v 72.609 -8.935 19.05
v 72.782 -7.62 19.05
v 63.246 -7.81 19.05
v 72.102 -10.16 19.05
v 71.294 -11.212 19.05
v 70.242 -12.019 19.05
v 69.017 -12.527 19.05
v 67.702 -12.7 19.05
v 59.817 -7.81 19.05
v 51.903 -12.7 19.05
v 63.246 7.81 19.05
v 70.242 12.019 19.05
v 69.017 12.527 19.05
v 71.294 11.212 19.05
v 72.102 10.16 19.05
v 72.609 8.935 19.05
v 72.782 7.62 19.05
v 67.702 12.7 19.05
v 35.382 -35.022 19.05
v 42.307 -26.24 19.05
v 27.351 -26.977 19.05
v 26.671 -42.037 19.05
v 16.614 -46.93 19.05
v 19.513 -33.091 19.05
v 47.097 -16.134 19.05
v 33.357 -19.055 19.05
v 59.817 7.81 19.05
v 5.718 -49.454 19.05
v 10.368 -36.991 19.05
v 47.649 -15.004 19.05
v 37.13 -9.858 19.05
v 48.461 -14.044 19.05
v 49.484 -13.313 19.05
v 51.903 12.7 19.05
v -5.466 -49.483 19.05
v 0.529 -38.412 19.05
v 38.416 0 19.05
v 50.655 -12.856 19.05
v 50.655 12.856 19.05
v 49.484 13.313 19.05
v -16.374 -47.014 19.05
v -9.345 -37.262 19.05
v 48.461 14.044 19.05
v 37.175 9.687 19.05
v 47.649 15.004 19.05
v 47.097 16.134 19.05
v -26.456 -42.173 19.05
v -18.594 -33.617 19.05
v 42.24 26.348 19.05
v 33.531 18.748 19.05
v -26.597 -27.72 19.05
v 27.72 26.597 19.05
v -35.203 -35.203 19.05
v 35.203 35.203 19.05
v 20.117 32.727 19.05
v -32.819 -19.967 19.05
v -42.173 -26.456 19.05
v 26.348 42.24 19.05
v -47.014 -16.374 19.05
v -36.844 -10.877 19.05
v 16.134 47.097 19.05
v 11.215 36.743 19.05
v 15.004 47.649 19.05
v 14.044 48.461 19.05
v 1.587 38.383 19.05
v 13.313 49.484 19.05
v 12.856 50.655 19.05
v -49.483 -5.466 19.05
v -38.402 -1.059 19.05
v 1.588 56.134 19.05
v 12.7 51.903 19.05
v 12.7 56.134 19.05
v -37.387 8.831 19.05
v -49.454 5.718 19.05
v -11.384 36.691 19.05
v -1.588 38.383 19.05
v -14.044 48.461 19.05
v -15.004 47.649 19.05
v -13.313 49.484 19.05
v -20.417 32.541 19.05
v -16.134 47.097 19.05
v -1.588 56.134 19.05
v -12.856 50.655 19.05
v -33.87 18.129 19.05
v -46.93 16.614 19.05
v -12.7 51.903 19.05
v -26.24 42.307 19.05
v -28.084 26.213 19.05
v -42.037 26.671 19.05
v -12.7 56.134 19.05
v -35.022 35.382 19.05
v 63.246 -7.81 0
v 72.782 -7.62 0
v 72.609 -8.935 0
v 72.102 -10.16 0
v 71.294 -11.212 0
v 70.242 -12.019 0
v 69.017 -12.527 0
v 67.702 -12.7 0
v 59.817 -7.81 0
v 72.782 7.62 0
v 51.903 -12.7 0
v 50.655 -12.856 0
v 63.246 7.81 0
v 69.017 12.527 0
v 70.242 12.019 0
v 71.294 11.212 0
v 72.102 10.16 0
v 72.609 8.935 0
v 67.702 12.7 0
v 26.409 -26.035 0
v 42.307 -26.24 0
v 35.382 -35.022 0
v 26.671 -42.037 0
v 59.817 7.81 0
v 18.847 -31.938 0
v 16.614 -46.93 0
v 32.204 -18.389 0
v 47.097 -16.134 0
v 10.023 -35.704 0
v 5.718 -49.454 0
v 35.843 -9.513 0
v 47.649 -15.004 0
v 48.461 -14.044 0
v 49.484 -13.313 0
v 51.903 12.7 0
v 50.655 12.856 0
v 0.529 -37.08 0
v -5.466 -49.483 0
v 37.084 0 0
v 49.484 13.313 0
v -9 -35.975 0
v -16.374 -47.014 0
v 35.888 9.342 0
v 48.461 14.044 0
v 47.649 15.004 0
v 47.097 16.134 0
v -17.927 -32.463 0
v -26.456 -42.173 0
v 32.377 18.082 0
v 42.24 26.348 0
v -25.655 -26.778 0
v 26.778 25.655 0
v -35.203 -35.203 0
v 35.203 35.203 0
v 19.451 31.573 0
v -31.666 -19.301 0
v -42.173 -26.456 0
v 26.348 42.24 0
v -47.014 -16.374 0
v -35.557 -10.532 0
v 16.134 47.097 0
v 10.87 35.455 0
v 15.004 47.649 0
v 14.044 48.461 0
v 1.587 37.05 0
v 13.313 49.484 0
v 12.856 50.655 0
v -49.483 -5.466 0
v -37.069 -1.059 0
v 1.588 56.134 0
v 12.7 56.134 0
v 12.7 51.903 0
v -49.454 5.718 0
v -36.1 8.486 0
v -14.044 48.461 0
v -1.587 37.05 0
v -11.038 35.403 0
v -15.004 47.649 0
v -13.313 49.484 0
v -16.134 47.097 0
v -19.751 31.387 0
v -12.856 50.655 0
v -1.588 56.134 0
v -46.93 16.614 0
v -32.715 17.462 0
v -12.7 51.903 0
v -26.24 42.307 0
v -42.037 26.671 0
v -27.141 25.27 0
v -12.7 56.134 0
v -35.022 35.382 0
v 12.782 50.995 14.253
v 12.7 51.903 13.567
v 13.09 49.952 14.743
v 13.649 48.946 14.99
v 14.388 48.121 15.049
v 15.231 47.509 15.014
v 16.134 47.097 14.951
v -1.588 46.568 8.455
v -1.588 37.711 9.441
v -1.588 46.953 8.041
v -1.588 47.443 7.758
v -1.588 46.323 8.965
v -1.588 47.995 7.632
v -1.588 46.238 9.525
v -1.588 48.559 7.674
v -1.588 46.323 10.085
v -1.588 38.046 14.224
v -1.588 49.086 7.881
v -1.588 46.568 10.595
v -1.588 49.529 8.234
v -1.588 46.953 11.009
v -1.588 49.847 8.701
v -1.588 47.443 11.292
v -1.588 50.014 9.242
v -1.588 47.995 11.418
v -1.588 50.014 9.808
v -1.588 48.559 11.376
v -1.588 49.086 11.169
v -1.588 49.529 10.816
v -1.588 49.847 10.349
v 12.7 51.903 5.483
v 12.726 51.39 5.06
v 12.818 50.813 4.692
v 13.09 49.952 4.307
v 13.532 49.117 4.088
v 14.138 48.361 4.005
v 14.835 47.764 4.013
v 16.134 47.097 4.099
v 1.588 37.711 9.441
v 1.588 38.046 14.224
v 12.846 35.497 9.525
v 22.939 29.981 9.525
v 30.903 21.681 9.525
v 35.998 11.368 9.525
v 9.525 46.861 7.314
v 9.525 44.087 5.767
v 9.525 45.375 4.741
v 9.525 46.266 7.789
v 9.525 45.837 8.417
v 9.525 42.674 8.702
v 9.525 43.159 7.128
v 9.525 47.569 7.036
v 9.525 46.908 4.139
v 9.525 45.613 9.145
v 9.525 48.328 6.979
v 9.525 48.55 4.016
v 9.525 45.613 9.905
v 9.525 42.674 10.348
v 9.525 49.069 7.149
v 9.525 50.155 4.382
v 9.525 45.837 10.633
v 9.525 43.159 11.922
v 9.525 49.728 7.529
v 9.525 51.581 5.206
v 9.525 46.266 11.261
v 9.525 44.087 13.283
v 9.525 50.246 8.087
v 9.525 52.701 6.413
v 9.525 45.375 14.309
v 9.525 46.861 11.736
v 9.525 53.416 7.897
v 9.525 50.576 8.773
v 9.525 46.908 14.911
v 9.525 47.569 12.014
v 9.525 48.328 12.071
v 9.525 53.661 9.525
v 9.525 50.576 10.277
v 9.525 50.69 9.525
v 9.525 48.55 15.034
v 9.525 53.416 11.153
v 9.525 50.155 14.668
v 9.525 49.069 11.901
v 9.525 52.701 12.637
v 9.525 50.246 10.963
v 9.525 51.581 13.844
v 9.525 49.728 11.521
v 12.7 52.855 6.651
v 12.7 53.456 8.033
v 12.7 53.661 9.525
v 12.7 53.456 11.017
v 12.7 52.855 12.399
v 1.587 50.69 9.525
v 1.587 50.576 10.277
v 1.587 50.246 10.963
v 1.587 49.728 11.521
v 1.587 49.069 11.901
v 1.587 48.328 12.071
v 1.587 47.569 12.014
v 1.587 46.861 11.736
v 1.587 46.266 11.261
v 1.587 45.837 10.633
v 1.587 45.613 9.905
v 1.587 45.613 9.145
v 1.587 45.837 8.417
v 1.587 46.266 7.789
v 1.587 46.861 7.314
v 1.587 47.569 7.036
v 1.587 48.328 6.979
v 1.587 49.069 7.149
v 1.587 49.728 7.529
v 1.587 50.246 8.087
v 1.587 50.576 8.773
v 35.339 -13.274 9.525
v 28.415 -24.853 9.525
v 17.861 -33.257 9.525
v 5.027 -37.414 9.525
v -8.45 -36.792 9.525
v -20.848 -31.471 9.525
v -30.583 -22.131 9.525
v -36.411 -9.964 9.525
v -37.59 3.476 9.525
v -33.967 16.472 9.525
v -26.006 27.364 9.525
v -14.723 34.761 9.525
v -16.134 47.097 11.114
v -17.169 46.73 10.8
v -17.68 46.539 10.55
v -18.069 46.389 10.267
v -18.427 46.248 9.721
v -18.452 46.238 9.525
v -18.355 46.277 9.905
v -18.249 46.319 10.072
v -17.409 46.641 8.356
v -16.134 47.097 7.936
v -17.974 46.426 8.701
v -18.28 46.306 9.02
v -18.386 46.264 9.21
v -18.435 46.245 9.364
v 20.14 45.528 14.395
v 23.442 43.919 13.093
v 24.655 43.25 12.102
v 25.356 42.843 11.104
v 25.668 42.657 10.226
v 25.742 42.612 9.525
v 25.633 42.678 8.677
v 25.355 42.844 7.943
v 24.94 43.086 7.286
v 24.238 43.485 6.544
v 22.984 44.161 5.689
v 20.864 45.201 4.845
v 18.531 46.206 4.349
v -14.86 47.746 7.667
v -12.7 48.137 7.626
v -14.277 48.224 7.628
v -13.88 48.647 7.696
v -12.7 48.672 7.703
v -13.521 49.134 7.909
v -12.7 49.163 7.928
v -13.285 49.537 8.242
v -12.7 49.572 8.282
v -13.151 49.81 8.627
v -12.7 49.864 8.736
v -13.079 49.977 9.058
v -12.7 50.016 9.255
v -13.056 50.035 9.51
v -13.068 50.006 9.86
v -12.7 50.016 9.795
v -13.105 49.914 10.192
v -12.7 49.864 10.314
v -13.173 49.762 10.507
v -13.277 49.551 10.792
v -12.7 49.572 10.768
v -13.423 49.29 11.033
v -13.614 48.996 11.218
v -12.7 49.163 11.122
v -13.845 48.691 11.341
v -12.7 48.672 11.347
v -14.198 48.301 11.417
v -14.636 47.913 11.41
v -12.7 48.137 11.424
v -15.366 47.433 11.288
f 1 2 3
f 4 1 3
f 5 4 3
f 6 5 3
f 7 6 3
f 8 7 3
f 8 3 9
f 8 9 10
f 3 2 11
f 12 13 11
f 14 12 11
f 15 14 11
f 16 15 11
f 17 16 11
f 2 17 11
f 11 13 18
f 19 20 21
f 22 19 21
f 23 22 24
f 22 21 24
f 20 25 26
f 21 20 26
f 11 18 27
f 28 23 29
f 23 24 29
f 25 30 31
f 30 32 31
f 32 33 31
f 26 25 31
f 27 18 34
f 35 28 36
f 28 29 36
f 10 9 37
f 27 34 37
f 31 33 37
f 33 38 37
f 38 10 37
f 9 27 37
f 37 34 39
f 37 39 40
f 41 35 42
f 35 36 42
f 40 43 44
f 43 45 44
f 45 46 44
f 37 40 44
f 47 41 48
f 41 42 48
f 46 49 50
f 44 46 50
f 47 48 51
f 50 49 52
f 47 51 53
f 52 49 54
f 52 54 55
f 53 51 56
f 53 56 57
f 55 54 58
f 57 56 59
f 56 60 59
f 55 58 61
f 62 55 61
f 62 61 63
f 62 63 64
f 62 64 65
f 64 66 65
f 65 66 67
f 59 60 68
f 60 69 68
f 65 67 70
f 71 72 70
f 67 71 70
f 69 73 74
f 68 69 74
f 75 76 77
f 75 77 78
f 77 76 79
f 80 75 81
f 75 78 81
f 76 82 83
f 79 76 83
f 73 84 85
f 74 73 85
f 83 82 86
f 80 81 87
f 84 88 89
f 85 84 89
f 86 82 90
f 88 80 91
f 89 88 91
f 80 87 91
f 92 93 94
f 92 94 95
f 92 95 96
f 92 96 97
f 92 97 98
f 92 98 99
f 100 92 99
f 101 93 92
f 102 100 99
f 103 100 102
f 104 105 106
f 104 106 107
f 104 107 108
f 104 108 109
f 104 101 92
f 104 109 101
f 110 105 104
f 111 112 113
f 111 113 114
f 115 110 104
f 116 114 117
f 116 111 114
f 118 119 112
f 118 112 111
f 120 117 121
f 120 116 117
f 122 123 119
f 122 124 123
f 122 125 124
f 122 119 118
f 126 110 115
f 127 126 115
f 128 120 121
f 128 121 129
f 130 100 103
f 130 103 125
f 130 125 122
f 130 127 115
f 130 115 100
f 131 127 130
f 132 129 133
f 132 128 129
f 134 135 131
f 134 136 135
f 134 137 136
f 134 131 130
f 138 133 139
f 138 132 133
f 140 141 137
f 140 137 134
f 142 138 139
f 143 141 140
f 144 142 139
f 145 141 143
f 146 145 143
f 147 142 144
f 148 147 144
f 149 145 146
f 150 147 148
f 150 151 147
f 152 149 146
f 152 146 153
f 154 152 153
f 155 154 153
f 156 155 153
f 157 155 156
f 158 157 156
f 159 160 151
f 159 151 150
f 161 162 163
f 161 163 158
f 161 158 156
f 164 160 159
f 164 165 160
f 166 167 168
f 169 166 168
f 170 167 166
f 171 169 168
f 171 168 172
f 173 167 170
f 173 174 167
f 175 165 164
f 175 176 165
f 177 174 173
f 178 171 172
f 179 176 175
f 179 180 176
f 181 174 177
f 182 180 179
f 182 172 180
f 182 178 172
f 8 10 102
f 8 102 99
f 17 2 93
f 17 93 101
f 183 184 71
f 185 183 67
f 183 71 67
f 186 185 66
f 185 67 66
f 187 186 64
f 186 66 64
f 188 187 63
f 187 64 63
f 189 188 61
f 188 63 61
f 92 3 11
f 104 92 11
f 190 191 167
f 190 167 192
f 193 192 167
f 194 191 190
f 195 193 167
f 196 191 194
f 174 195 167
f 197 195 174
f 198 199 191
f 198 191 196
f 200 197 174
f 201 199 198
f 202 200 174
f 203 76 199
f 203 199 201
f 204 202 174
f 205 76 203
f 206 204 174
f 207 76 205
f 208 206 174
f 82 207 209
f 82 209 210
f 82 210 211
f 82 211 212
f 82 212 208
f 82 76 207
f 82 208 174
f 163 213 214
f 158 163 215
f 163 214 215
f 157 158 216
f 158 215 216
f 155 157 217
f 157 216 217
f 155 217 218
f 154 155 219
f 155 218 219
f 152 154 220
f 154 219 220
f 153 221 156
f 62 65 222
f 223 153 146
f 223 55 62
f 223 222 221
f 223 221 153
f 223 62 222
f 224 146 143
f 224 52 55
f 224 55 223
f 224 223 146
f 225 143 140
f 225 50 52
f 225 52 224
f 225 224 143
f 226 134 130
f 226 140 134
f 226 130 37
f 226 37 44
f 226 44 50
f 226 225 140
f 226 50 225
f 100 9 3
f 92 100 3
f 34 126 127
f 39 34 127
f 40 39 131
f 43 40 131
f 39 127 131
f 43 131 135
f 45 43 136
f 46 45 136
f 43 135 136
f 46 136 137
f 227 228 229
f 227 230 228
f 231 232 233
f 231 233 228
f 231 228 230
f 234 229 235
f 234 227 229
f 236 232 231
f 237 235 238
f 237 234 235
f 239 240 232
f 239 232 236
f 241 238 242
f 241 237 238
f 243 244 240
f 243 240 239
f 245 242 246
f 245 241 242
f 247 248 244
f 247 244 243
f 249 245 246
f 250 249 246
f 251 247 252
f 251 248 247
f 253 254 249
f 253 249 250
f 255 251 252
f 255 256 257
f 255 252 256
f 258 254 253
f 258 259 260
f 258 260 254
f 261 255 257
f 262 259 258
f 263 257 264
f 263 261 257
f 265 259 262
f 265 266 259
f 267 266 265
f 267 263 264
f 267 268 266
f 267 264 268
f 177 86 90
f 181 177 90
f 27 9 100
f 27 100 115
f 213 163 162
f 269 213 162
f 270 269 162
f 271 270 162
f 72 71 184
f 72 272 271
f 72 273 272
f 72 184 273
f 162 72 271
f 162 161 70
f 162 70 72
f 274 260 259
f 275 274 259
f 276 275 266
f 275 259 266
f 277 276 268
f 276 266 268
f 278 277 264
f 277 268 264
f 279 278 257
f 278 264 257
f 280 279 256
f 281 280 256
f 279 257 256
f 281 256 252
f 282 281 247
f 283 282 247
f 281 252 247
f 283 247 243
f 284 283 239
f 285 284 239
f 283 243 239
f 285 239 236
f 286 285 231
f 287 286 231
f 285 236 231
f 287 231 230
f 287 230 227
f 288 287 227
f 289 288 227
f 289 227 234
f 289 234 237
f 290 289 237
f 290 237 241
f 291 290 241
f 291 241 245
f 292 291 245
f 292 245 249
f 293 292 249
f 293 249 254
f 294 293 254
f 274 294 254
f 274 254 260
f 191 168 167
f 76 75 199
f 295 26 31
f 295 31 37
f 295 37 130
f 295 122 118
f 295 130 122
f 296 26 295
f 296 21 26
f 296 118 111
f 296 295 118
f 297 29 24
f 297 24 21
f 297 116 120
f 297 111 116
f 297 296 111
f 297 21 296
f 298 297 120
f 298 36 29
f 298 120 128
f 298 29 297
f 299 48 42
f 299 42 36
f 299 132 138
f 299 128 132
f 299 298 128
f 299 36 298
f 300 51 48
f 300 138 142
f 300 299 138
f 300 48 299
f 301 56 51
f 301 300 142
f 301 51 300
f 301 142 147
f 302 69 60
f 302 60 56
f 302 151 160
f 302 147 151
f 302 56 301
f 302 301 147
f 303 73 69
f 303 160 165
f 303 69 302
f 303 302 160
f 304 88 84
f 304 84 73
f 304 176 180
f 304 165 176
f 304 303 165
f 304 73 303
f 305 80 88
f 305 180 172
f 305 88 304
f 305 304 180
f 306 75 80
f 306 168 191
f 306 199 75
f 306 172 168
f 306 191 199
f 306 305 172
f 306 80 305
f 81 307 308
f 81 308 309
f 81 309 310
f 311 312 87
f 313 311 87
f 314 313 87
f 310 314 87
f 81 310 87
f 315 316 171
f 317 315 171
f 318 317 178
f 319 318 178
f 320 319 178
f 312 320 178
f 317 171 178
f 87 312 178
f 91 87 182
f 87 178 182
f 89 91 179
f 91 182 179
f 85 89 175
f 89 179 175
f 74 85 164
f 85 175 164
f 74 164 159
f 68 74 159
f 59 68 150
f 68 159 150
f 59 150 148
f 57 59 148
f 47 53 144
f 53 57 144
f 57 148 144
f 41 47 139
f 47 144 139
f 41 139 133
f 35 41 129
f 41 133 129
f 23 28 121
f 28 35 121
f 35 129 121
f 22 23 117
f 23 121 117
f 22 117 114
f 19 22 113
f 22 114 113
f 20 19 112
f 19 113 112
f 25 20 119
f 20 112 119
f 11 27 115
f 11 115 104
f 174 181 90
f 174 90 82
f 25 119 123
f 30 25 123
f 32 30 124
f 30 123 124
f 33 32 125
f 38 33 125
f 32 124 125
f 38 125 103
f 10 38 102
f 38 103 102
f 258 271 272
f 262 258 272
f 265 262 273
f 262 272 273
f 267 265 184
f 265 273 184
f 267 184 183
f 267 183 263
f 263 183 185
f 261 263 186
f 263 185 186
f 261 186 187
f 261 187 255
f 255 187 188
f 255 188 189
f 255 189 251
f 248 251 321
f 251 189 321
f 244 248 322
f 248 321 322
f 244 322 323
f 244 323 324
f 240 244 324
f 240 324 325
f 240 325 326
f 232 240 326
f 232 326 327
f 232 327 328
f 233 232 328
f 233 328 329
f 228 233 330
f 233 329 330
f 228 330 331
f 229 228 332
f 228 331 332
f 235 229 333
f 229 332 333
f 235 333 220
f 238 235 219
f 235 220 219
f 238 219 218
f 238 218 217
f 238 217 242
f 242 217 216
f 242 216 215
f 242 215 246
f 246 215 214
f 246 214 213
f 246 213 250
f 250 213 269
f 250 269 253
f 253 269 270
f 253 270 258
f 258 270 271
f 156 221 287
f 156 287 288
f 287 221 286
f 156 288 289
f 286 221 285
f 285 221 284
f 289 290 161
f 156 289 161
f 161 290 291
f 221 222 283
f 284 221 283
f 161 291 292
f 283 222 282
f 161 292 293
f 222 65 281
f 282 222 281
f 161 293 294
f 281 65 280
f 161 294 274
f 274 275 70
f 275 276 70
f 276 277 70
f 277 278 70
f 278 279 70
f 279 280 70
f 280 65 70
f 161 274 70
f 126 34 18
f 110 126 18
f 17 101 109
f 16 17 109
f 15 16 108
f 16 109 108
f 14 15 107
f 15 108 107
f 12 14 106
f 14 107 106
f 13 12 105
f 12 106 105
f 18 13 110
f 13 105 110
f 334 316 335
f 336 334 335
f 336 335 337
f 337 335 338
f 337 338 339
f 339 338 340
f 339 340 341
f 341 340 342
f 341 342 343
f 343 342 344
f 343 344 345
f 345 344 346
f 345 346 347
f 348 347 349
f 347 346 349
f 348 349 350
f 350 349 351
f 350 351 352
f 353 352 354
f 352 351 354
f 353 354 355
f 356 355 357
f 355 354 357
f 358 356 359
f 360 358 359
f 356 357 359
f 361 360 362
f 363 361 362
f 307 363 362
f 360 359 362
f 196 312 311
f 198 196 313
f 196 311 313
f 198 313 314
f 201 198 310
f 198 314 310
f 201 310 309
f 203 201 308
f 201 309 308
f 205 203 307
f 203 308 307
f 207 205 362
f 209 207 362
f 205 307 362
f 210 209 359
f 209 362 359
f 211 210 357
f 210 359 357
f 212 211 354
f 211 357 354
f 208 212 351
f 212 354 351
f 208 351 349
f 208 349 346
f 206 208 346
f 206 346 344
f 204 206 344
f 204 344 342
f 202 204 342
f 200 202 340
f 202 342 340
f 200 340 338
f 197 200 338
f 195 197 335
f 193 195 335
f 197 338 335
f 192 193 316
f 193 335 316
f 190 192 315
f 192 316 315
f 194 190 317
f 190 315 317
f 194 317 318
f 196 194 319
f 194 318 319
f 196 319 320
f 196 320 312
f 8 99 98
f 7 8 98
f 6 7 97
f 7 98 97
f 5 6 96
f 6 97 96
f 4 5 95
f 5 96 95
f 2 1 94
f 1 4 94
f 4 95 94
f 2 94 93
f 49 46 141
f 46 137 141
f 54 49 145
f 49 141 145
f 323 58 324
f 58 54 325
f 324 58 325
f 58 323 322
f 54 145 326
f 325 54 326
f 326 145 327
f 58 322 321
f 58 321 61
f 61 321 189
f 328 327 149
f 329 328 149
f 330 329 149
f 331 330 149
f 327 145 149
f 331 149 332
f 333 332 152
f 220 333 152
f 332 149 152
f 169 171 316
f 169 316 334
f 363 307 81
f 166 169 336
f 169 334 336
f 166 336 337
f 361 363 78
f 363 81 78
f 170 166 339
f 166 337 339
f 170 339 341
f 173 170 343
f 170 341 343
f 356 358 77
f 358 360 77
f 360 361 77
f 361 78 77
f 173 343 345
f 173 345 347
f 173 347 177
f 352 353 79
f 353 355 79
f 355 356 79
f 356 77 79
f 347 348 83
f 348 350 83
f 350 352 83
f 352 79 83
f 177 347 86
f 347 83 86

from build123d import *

# Parameters (mm, degrees)
F0_R           = 49.784
F0_R_2         = 37.084
F1_DEPTH       = 19.05
F2_R           = 37.084
F3_DEPTH       = 19.05
F3_TAPER       = -4
F4_W           = 25.4
F4_H           = 17.7178942325
F5_DEPTH       = 19.05
F6_W           = 3.175
F6_H           = 19.0839946053
F7_DEPTH       = 19.0510001
F8_W           = 34.3662
F8_H           = 25.4
F9_DEPTH       = 19.05
F10_W          = 3.429
F10_H          = 15.621
F11_DEPTH      = 19.0510001
F12_R          = 2.5527
F13_DEPTH      = 11.1125
F13_DEPTH_BACK = 60.0833057675
F14_R          = 5.5245
F15_DEPTH      = 3.175
F15_DEPTH_BACK = 60.0833057675
F17_D          = 3.7973
F18_T1_DEPTH   = 19.05
F18_T6_DEPTH   = 13.4160756928
F18_S7_R       = 5.5245
F18_T8_DEPTH   = 9
F18_T12_DEPTH  = 13.4160756928
F18_S13_R      = 5.5245
F18_T14_DEPTH  = 9
F18_T18_DEPTH  = 17.0419256928
F18_S19_R      = 1.89865
F18_T20_DEPTH  = 11
F18_T24_DEPTH  = 17.0419256928
F18_S25_R      = 1.89865
F18_T26_DEPTH  = 11
F18_T27_DEPTH  = 44.45


# Not quite as in the source:
# - a fillet or chamfer that OpenCascade refuses, or shapes differently, is made with other operations: its cross-section is extruded or revolved along the edge and cut away or added


with BuildPart() as f1:
    # F0 (on Top) → F1 (new body)
    with BuildSketch(Plane.XY):
        Circle(F0_R)
        Circle(F0_R_2, mode=Mode.SUBTRACT)
    extrude(amount=F1_DEPTH)

    # F2 (on face) → F3 (cut)
    with BuildSketch(Plane(origin=(0, 0, 0), x_dir=(1, 0, 0), z_dir=(0, 0, -1))):
        Circle(F2_R)
    extrude(amount=-F3_DEPTH, taper=F3_TAPER, mode=Mode.SUBTRACT)

    # F4 (on face) → F5 (join)
    with BuildSketch(Plane.XY.offset(19.05)):
        with Locations((0, 47.2750528838)):
            Rectangle(F4_W, F4_H)
    extrude(amount=-F5_DEPTH)

    # F6 (on face) → F7 (cut, through all)
    with BuildSketch(Plane.XY.offset(19.05)):
        with Locations((0, 46.5920026974)):
            Rectangle(F6_W, F6_H)
    extrude(amount=-F7_DEPTH, mode=Mode.SUBTRACT)

    # F8 (on face) → F9 (join)
    with BuildSketch(Plane.XY.offset(19.05)):
        with Locations((55.5992057675, 0)):
            Rectangle(F8_W, F8_H)
    extrude(amount=-F9_DEPTH)

    # F10 (on face) → F11 (cut, through all)
    with BuildSketch(Plane.XY.offset(19.05)):
        with Locations((61.5315, 0)):
            Rectangle(F10_W, F10_H)
    extrude(amount=-F11_DEPTH, mode=Mode.SUBTRACT)

    # F12 (on face) → F13 (cut, two sides)
    with BuildSketch(Plane.YZ.offset(12.7)) as f13_sk:
        with Locations((48.1368534078, 9.525)):
            Circle(F12_R)
    extrude(amount=-F13_DEPTH, mode=Mode.SUBTRACT)
    extrude(f13_sk.sketch, amount=F13_DEPTH_BACK, mode=Mode.SUBTRACT)

    # F14 (on face) → F15 (cut, two sides)
    with BuildSketch(Plane.YZ.offset(12.7)) as f15_sk:
        with Locations((48.1368534078, 9.525)):
            Circle(F14_R)
    extrude(amount=-F15_DEPTH, mode=Mode.SUBTRACT)
    extrude(f15_sk.sketch, amount=F15_DEPTH_BACK, mode=Mode.SUBTRACT)

    # F17 (through all)
    with Locations(Plane.YZ.offset(-1.5875)):
        with Locations((48.1368534078, 9.525)):
            Hole(F17_D / 2)

    # F18: fillet of radius 5.08 on 8 edges, made by hand

    # F18_s2 → F18_t1 (join)
    with BuildSketch(Plane.XY):
        with BuildLine():
            ThreePointArc((47.0972426029, -16.1337037037), (48.949846917, -13.6466245522), (51.9030836849, -12.7))
            Line((51.9030836849, -12.7), (48.1368534078, -12.7))
            ThreePointArc((48.1368534078, -12.7), (47.6479888455, -14.4262197049), (47.0972426029, -16.1337037037))
        make_face()
        with BuildLine():
            ThreePointArc((51.9030836849, 12.7), (48.949846917, 13.6466245522), (47.0972426029, 16.1337037037))
            ThreePointArc((47.0972426029, 16.1337037037), (47.6479888455, 14.4262197049), (48.1368534078, 12.7))
            Line((48.1368534078, 12.7), (51.9030836849, 12.7))
        make_face()
    extrude(amount=F18_T1_DEPTH)


with BuildPart() as f18_tool4:
    # F18_s5 → F18_t6 (new body)
    with BuildSketch(Plane.XY.offset(13.4160756928)):
        with BuildLine():
            ThreePointArc((12.7, 51.9030836849), (13.6466245522, 48.949846917), (16.1337037037, 47.0972426029))
            ThreePointArc((16.1337037037, 47.0972426029), (14.4262197049, 47.6479888455), (12.7, 48.1368534078))
            Line((12.7, 48.1368534078), (12.7, 51.9030836849))
        make_face()
    extrude(amount=-F18_T6_DEPTH)

    # F18_s7 → F18_t8 (cut, symmetric)
    with BuildSketch(Plane.YZ.offset(14.4)):
        with Locations((48.1368534078, 9.525)):
            Circle(F18_S7_R)
    extrude(amount=F18_T8_DEPTH, both=True, mode=Mode.SUBTRACT)


with BuildPart() as f1_1:
    add(f1.part)

    # F18_t3: union F18_tool4
    add(f18_tool4.part)


with BuildPart() as f18_tool10:
    # F18_s11 → F18_t12 (new body)
    with BuildSketch(Plane.XY.offset(19.05)):
        with BuildLine():
            ThreePointArc((12.7, 51.9030836849), (13.6466245522, 48.949846917), (16.1337037037, 47.0972426029))
            ThreePointArc((16.1337037037, 47.0972426029), (14.4262197049, 47.6479888455), (12.7, 48.1368534078))
            Line((12.7, 48.1368534078), (12.7, 51.9030836849))
        make_face()
    extrude(amount=-F18_T12_DEPTH)

    # F18_s13 → F18_t14 (cut, symmetric)
    with BuildSketch(Plane.YZ.offset(14.4)):
        with Locations((48.1368534078, 9.525)):
            Circle(F18_S13_R)
    extrude(amount=F18_T14_DEPTH, both=True, mode=Mode.SUBTRACT)


with BuildPart() as f1_2:
    add(f1_1.part)

    # F18_t9: union F18_tool10
    add(f18_tool10.part)


with BuildPart() as f18_tool16:
    # F18_s17 → F18_t18 (new body)
    with BuildSketch(Plane.XY.offset(19.05)):
        with BuildLine():
            ThreePointArc((-16.1337037037, 47.0972426029), (-13.6466245522, 48.949846917), (-12.7, 51.9030836849))
            Line((-12.7, 51.9030836849), (-12.7, 48.1368534078))
            ThreePointArc((-12.7, 48.1368534078), (-14.4262197049, 47.6479888455), (-16.1337037037, 47.0972426029))
        make_face()
    extrude(amount=-F18_T18_DEPTH)

    # F18_s19 → F18_t20 (cut, symmetric)
    with BuildSketch(Plane.YZ.offset(-14.4)):
        with Locations((48.1368534078, 9.525)):
            Circle(F18_S19_R)
    extrude(amount=F18_T20_DEPTH, both=True, mode=Mode.SUBTRACT)


with BuildPart() as f1_3:
    add(f1_2.part)

    # F18_t15: union F18_tool16
    add(f18_tool16.part)


with BuildPart() as f18_tool22:
    # F18_s23 → F18_t24 (new body)
    with BuildSketch(Plane.XY.offset(17.0419256928)):
        with BuildLine():
            ThreePointArc((-16.1337037037, 47.0972426029), (-13.6466245522, 48.949846917), (-12.7, 51.9030836849))
            Line((-12.7, 51.9030836849), (-12.7, 48.1368534078))
            ThreePointArc((-12.7, 48.1368534078), (-14.4262197049, 47.6479888455), (-16.1337037037, 47.0972426029))
        make_face()
    extrude(amount=-F18_T24_DEPTH)

    # F18_s25 → F18_t26 (cut, symmetric)
    with BuildSketch(Plane.YZ.offset(-14.4)):
        with Locations((48.1368534078, 9.525)):
            Circle(F18_S25_R)
    extrude(amount=F18_T26_DEPTH, both=True, mode=Mode.SUBTRACT)


with BuildPart() as f1_4:
    add(f1_3.part)

    # F18_t21: union F18_tool22
    add(f18_tool22.part)

    # F18_s28 → F18_t27 (cut)
    with BuildSketch(Plane.XY.offset(-12.7)):
        with BuildLine():
            ThreePointArc((67.7023057675, -12.7), (71.294408216, -11.2121024484), (72.7823057675, -7.62))
            Line((72.7823057675, -7.62), (72.7823057675, -12.7))
            Line((72.7823057675, -12.7), (67.7023057675, -12.7))
        make_face()
        with BuildLine():
            ThreePointArc((72.7823057675, 7.62), (71.294408216, 11.2121024484), (67.7023057675, 12.7))
            Line((67.7023057675, 12.7), (72.7823057675, 12.7))
            Line((72.7823057675, 12.7), (72.7823057675, 7.62))
        make_face()
    extrude(amount=F18_T27_DEPTH, mode=Mode.SUBTRACT)


solid = f1_4.part
